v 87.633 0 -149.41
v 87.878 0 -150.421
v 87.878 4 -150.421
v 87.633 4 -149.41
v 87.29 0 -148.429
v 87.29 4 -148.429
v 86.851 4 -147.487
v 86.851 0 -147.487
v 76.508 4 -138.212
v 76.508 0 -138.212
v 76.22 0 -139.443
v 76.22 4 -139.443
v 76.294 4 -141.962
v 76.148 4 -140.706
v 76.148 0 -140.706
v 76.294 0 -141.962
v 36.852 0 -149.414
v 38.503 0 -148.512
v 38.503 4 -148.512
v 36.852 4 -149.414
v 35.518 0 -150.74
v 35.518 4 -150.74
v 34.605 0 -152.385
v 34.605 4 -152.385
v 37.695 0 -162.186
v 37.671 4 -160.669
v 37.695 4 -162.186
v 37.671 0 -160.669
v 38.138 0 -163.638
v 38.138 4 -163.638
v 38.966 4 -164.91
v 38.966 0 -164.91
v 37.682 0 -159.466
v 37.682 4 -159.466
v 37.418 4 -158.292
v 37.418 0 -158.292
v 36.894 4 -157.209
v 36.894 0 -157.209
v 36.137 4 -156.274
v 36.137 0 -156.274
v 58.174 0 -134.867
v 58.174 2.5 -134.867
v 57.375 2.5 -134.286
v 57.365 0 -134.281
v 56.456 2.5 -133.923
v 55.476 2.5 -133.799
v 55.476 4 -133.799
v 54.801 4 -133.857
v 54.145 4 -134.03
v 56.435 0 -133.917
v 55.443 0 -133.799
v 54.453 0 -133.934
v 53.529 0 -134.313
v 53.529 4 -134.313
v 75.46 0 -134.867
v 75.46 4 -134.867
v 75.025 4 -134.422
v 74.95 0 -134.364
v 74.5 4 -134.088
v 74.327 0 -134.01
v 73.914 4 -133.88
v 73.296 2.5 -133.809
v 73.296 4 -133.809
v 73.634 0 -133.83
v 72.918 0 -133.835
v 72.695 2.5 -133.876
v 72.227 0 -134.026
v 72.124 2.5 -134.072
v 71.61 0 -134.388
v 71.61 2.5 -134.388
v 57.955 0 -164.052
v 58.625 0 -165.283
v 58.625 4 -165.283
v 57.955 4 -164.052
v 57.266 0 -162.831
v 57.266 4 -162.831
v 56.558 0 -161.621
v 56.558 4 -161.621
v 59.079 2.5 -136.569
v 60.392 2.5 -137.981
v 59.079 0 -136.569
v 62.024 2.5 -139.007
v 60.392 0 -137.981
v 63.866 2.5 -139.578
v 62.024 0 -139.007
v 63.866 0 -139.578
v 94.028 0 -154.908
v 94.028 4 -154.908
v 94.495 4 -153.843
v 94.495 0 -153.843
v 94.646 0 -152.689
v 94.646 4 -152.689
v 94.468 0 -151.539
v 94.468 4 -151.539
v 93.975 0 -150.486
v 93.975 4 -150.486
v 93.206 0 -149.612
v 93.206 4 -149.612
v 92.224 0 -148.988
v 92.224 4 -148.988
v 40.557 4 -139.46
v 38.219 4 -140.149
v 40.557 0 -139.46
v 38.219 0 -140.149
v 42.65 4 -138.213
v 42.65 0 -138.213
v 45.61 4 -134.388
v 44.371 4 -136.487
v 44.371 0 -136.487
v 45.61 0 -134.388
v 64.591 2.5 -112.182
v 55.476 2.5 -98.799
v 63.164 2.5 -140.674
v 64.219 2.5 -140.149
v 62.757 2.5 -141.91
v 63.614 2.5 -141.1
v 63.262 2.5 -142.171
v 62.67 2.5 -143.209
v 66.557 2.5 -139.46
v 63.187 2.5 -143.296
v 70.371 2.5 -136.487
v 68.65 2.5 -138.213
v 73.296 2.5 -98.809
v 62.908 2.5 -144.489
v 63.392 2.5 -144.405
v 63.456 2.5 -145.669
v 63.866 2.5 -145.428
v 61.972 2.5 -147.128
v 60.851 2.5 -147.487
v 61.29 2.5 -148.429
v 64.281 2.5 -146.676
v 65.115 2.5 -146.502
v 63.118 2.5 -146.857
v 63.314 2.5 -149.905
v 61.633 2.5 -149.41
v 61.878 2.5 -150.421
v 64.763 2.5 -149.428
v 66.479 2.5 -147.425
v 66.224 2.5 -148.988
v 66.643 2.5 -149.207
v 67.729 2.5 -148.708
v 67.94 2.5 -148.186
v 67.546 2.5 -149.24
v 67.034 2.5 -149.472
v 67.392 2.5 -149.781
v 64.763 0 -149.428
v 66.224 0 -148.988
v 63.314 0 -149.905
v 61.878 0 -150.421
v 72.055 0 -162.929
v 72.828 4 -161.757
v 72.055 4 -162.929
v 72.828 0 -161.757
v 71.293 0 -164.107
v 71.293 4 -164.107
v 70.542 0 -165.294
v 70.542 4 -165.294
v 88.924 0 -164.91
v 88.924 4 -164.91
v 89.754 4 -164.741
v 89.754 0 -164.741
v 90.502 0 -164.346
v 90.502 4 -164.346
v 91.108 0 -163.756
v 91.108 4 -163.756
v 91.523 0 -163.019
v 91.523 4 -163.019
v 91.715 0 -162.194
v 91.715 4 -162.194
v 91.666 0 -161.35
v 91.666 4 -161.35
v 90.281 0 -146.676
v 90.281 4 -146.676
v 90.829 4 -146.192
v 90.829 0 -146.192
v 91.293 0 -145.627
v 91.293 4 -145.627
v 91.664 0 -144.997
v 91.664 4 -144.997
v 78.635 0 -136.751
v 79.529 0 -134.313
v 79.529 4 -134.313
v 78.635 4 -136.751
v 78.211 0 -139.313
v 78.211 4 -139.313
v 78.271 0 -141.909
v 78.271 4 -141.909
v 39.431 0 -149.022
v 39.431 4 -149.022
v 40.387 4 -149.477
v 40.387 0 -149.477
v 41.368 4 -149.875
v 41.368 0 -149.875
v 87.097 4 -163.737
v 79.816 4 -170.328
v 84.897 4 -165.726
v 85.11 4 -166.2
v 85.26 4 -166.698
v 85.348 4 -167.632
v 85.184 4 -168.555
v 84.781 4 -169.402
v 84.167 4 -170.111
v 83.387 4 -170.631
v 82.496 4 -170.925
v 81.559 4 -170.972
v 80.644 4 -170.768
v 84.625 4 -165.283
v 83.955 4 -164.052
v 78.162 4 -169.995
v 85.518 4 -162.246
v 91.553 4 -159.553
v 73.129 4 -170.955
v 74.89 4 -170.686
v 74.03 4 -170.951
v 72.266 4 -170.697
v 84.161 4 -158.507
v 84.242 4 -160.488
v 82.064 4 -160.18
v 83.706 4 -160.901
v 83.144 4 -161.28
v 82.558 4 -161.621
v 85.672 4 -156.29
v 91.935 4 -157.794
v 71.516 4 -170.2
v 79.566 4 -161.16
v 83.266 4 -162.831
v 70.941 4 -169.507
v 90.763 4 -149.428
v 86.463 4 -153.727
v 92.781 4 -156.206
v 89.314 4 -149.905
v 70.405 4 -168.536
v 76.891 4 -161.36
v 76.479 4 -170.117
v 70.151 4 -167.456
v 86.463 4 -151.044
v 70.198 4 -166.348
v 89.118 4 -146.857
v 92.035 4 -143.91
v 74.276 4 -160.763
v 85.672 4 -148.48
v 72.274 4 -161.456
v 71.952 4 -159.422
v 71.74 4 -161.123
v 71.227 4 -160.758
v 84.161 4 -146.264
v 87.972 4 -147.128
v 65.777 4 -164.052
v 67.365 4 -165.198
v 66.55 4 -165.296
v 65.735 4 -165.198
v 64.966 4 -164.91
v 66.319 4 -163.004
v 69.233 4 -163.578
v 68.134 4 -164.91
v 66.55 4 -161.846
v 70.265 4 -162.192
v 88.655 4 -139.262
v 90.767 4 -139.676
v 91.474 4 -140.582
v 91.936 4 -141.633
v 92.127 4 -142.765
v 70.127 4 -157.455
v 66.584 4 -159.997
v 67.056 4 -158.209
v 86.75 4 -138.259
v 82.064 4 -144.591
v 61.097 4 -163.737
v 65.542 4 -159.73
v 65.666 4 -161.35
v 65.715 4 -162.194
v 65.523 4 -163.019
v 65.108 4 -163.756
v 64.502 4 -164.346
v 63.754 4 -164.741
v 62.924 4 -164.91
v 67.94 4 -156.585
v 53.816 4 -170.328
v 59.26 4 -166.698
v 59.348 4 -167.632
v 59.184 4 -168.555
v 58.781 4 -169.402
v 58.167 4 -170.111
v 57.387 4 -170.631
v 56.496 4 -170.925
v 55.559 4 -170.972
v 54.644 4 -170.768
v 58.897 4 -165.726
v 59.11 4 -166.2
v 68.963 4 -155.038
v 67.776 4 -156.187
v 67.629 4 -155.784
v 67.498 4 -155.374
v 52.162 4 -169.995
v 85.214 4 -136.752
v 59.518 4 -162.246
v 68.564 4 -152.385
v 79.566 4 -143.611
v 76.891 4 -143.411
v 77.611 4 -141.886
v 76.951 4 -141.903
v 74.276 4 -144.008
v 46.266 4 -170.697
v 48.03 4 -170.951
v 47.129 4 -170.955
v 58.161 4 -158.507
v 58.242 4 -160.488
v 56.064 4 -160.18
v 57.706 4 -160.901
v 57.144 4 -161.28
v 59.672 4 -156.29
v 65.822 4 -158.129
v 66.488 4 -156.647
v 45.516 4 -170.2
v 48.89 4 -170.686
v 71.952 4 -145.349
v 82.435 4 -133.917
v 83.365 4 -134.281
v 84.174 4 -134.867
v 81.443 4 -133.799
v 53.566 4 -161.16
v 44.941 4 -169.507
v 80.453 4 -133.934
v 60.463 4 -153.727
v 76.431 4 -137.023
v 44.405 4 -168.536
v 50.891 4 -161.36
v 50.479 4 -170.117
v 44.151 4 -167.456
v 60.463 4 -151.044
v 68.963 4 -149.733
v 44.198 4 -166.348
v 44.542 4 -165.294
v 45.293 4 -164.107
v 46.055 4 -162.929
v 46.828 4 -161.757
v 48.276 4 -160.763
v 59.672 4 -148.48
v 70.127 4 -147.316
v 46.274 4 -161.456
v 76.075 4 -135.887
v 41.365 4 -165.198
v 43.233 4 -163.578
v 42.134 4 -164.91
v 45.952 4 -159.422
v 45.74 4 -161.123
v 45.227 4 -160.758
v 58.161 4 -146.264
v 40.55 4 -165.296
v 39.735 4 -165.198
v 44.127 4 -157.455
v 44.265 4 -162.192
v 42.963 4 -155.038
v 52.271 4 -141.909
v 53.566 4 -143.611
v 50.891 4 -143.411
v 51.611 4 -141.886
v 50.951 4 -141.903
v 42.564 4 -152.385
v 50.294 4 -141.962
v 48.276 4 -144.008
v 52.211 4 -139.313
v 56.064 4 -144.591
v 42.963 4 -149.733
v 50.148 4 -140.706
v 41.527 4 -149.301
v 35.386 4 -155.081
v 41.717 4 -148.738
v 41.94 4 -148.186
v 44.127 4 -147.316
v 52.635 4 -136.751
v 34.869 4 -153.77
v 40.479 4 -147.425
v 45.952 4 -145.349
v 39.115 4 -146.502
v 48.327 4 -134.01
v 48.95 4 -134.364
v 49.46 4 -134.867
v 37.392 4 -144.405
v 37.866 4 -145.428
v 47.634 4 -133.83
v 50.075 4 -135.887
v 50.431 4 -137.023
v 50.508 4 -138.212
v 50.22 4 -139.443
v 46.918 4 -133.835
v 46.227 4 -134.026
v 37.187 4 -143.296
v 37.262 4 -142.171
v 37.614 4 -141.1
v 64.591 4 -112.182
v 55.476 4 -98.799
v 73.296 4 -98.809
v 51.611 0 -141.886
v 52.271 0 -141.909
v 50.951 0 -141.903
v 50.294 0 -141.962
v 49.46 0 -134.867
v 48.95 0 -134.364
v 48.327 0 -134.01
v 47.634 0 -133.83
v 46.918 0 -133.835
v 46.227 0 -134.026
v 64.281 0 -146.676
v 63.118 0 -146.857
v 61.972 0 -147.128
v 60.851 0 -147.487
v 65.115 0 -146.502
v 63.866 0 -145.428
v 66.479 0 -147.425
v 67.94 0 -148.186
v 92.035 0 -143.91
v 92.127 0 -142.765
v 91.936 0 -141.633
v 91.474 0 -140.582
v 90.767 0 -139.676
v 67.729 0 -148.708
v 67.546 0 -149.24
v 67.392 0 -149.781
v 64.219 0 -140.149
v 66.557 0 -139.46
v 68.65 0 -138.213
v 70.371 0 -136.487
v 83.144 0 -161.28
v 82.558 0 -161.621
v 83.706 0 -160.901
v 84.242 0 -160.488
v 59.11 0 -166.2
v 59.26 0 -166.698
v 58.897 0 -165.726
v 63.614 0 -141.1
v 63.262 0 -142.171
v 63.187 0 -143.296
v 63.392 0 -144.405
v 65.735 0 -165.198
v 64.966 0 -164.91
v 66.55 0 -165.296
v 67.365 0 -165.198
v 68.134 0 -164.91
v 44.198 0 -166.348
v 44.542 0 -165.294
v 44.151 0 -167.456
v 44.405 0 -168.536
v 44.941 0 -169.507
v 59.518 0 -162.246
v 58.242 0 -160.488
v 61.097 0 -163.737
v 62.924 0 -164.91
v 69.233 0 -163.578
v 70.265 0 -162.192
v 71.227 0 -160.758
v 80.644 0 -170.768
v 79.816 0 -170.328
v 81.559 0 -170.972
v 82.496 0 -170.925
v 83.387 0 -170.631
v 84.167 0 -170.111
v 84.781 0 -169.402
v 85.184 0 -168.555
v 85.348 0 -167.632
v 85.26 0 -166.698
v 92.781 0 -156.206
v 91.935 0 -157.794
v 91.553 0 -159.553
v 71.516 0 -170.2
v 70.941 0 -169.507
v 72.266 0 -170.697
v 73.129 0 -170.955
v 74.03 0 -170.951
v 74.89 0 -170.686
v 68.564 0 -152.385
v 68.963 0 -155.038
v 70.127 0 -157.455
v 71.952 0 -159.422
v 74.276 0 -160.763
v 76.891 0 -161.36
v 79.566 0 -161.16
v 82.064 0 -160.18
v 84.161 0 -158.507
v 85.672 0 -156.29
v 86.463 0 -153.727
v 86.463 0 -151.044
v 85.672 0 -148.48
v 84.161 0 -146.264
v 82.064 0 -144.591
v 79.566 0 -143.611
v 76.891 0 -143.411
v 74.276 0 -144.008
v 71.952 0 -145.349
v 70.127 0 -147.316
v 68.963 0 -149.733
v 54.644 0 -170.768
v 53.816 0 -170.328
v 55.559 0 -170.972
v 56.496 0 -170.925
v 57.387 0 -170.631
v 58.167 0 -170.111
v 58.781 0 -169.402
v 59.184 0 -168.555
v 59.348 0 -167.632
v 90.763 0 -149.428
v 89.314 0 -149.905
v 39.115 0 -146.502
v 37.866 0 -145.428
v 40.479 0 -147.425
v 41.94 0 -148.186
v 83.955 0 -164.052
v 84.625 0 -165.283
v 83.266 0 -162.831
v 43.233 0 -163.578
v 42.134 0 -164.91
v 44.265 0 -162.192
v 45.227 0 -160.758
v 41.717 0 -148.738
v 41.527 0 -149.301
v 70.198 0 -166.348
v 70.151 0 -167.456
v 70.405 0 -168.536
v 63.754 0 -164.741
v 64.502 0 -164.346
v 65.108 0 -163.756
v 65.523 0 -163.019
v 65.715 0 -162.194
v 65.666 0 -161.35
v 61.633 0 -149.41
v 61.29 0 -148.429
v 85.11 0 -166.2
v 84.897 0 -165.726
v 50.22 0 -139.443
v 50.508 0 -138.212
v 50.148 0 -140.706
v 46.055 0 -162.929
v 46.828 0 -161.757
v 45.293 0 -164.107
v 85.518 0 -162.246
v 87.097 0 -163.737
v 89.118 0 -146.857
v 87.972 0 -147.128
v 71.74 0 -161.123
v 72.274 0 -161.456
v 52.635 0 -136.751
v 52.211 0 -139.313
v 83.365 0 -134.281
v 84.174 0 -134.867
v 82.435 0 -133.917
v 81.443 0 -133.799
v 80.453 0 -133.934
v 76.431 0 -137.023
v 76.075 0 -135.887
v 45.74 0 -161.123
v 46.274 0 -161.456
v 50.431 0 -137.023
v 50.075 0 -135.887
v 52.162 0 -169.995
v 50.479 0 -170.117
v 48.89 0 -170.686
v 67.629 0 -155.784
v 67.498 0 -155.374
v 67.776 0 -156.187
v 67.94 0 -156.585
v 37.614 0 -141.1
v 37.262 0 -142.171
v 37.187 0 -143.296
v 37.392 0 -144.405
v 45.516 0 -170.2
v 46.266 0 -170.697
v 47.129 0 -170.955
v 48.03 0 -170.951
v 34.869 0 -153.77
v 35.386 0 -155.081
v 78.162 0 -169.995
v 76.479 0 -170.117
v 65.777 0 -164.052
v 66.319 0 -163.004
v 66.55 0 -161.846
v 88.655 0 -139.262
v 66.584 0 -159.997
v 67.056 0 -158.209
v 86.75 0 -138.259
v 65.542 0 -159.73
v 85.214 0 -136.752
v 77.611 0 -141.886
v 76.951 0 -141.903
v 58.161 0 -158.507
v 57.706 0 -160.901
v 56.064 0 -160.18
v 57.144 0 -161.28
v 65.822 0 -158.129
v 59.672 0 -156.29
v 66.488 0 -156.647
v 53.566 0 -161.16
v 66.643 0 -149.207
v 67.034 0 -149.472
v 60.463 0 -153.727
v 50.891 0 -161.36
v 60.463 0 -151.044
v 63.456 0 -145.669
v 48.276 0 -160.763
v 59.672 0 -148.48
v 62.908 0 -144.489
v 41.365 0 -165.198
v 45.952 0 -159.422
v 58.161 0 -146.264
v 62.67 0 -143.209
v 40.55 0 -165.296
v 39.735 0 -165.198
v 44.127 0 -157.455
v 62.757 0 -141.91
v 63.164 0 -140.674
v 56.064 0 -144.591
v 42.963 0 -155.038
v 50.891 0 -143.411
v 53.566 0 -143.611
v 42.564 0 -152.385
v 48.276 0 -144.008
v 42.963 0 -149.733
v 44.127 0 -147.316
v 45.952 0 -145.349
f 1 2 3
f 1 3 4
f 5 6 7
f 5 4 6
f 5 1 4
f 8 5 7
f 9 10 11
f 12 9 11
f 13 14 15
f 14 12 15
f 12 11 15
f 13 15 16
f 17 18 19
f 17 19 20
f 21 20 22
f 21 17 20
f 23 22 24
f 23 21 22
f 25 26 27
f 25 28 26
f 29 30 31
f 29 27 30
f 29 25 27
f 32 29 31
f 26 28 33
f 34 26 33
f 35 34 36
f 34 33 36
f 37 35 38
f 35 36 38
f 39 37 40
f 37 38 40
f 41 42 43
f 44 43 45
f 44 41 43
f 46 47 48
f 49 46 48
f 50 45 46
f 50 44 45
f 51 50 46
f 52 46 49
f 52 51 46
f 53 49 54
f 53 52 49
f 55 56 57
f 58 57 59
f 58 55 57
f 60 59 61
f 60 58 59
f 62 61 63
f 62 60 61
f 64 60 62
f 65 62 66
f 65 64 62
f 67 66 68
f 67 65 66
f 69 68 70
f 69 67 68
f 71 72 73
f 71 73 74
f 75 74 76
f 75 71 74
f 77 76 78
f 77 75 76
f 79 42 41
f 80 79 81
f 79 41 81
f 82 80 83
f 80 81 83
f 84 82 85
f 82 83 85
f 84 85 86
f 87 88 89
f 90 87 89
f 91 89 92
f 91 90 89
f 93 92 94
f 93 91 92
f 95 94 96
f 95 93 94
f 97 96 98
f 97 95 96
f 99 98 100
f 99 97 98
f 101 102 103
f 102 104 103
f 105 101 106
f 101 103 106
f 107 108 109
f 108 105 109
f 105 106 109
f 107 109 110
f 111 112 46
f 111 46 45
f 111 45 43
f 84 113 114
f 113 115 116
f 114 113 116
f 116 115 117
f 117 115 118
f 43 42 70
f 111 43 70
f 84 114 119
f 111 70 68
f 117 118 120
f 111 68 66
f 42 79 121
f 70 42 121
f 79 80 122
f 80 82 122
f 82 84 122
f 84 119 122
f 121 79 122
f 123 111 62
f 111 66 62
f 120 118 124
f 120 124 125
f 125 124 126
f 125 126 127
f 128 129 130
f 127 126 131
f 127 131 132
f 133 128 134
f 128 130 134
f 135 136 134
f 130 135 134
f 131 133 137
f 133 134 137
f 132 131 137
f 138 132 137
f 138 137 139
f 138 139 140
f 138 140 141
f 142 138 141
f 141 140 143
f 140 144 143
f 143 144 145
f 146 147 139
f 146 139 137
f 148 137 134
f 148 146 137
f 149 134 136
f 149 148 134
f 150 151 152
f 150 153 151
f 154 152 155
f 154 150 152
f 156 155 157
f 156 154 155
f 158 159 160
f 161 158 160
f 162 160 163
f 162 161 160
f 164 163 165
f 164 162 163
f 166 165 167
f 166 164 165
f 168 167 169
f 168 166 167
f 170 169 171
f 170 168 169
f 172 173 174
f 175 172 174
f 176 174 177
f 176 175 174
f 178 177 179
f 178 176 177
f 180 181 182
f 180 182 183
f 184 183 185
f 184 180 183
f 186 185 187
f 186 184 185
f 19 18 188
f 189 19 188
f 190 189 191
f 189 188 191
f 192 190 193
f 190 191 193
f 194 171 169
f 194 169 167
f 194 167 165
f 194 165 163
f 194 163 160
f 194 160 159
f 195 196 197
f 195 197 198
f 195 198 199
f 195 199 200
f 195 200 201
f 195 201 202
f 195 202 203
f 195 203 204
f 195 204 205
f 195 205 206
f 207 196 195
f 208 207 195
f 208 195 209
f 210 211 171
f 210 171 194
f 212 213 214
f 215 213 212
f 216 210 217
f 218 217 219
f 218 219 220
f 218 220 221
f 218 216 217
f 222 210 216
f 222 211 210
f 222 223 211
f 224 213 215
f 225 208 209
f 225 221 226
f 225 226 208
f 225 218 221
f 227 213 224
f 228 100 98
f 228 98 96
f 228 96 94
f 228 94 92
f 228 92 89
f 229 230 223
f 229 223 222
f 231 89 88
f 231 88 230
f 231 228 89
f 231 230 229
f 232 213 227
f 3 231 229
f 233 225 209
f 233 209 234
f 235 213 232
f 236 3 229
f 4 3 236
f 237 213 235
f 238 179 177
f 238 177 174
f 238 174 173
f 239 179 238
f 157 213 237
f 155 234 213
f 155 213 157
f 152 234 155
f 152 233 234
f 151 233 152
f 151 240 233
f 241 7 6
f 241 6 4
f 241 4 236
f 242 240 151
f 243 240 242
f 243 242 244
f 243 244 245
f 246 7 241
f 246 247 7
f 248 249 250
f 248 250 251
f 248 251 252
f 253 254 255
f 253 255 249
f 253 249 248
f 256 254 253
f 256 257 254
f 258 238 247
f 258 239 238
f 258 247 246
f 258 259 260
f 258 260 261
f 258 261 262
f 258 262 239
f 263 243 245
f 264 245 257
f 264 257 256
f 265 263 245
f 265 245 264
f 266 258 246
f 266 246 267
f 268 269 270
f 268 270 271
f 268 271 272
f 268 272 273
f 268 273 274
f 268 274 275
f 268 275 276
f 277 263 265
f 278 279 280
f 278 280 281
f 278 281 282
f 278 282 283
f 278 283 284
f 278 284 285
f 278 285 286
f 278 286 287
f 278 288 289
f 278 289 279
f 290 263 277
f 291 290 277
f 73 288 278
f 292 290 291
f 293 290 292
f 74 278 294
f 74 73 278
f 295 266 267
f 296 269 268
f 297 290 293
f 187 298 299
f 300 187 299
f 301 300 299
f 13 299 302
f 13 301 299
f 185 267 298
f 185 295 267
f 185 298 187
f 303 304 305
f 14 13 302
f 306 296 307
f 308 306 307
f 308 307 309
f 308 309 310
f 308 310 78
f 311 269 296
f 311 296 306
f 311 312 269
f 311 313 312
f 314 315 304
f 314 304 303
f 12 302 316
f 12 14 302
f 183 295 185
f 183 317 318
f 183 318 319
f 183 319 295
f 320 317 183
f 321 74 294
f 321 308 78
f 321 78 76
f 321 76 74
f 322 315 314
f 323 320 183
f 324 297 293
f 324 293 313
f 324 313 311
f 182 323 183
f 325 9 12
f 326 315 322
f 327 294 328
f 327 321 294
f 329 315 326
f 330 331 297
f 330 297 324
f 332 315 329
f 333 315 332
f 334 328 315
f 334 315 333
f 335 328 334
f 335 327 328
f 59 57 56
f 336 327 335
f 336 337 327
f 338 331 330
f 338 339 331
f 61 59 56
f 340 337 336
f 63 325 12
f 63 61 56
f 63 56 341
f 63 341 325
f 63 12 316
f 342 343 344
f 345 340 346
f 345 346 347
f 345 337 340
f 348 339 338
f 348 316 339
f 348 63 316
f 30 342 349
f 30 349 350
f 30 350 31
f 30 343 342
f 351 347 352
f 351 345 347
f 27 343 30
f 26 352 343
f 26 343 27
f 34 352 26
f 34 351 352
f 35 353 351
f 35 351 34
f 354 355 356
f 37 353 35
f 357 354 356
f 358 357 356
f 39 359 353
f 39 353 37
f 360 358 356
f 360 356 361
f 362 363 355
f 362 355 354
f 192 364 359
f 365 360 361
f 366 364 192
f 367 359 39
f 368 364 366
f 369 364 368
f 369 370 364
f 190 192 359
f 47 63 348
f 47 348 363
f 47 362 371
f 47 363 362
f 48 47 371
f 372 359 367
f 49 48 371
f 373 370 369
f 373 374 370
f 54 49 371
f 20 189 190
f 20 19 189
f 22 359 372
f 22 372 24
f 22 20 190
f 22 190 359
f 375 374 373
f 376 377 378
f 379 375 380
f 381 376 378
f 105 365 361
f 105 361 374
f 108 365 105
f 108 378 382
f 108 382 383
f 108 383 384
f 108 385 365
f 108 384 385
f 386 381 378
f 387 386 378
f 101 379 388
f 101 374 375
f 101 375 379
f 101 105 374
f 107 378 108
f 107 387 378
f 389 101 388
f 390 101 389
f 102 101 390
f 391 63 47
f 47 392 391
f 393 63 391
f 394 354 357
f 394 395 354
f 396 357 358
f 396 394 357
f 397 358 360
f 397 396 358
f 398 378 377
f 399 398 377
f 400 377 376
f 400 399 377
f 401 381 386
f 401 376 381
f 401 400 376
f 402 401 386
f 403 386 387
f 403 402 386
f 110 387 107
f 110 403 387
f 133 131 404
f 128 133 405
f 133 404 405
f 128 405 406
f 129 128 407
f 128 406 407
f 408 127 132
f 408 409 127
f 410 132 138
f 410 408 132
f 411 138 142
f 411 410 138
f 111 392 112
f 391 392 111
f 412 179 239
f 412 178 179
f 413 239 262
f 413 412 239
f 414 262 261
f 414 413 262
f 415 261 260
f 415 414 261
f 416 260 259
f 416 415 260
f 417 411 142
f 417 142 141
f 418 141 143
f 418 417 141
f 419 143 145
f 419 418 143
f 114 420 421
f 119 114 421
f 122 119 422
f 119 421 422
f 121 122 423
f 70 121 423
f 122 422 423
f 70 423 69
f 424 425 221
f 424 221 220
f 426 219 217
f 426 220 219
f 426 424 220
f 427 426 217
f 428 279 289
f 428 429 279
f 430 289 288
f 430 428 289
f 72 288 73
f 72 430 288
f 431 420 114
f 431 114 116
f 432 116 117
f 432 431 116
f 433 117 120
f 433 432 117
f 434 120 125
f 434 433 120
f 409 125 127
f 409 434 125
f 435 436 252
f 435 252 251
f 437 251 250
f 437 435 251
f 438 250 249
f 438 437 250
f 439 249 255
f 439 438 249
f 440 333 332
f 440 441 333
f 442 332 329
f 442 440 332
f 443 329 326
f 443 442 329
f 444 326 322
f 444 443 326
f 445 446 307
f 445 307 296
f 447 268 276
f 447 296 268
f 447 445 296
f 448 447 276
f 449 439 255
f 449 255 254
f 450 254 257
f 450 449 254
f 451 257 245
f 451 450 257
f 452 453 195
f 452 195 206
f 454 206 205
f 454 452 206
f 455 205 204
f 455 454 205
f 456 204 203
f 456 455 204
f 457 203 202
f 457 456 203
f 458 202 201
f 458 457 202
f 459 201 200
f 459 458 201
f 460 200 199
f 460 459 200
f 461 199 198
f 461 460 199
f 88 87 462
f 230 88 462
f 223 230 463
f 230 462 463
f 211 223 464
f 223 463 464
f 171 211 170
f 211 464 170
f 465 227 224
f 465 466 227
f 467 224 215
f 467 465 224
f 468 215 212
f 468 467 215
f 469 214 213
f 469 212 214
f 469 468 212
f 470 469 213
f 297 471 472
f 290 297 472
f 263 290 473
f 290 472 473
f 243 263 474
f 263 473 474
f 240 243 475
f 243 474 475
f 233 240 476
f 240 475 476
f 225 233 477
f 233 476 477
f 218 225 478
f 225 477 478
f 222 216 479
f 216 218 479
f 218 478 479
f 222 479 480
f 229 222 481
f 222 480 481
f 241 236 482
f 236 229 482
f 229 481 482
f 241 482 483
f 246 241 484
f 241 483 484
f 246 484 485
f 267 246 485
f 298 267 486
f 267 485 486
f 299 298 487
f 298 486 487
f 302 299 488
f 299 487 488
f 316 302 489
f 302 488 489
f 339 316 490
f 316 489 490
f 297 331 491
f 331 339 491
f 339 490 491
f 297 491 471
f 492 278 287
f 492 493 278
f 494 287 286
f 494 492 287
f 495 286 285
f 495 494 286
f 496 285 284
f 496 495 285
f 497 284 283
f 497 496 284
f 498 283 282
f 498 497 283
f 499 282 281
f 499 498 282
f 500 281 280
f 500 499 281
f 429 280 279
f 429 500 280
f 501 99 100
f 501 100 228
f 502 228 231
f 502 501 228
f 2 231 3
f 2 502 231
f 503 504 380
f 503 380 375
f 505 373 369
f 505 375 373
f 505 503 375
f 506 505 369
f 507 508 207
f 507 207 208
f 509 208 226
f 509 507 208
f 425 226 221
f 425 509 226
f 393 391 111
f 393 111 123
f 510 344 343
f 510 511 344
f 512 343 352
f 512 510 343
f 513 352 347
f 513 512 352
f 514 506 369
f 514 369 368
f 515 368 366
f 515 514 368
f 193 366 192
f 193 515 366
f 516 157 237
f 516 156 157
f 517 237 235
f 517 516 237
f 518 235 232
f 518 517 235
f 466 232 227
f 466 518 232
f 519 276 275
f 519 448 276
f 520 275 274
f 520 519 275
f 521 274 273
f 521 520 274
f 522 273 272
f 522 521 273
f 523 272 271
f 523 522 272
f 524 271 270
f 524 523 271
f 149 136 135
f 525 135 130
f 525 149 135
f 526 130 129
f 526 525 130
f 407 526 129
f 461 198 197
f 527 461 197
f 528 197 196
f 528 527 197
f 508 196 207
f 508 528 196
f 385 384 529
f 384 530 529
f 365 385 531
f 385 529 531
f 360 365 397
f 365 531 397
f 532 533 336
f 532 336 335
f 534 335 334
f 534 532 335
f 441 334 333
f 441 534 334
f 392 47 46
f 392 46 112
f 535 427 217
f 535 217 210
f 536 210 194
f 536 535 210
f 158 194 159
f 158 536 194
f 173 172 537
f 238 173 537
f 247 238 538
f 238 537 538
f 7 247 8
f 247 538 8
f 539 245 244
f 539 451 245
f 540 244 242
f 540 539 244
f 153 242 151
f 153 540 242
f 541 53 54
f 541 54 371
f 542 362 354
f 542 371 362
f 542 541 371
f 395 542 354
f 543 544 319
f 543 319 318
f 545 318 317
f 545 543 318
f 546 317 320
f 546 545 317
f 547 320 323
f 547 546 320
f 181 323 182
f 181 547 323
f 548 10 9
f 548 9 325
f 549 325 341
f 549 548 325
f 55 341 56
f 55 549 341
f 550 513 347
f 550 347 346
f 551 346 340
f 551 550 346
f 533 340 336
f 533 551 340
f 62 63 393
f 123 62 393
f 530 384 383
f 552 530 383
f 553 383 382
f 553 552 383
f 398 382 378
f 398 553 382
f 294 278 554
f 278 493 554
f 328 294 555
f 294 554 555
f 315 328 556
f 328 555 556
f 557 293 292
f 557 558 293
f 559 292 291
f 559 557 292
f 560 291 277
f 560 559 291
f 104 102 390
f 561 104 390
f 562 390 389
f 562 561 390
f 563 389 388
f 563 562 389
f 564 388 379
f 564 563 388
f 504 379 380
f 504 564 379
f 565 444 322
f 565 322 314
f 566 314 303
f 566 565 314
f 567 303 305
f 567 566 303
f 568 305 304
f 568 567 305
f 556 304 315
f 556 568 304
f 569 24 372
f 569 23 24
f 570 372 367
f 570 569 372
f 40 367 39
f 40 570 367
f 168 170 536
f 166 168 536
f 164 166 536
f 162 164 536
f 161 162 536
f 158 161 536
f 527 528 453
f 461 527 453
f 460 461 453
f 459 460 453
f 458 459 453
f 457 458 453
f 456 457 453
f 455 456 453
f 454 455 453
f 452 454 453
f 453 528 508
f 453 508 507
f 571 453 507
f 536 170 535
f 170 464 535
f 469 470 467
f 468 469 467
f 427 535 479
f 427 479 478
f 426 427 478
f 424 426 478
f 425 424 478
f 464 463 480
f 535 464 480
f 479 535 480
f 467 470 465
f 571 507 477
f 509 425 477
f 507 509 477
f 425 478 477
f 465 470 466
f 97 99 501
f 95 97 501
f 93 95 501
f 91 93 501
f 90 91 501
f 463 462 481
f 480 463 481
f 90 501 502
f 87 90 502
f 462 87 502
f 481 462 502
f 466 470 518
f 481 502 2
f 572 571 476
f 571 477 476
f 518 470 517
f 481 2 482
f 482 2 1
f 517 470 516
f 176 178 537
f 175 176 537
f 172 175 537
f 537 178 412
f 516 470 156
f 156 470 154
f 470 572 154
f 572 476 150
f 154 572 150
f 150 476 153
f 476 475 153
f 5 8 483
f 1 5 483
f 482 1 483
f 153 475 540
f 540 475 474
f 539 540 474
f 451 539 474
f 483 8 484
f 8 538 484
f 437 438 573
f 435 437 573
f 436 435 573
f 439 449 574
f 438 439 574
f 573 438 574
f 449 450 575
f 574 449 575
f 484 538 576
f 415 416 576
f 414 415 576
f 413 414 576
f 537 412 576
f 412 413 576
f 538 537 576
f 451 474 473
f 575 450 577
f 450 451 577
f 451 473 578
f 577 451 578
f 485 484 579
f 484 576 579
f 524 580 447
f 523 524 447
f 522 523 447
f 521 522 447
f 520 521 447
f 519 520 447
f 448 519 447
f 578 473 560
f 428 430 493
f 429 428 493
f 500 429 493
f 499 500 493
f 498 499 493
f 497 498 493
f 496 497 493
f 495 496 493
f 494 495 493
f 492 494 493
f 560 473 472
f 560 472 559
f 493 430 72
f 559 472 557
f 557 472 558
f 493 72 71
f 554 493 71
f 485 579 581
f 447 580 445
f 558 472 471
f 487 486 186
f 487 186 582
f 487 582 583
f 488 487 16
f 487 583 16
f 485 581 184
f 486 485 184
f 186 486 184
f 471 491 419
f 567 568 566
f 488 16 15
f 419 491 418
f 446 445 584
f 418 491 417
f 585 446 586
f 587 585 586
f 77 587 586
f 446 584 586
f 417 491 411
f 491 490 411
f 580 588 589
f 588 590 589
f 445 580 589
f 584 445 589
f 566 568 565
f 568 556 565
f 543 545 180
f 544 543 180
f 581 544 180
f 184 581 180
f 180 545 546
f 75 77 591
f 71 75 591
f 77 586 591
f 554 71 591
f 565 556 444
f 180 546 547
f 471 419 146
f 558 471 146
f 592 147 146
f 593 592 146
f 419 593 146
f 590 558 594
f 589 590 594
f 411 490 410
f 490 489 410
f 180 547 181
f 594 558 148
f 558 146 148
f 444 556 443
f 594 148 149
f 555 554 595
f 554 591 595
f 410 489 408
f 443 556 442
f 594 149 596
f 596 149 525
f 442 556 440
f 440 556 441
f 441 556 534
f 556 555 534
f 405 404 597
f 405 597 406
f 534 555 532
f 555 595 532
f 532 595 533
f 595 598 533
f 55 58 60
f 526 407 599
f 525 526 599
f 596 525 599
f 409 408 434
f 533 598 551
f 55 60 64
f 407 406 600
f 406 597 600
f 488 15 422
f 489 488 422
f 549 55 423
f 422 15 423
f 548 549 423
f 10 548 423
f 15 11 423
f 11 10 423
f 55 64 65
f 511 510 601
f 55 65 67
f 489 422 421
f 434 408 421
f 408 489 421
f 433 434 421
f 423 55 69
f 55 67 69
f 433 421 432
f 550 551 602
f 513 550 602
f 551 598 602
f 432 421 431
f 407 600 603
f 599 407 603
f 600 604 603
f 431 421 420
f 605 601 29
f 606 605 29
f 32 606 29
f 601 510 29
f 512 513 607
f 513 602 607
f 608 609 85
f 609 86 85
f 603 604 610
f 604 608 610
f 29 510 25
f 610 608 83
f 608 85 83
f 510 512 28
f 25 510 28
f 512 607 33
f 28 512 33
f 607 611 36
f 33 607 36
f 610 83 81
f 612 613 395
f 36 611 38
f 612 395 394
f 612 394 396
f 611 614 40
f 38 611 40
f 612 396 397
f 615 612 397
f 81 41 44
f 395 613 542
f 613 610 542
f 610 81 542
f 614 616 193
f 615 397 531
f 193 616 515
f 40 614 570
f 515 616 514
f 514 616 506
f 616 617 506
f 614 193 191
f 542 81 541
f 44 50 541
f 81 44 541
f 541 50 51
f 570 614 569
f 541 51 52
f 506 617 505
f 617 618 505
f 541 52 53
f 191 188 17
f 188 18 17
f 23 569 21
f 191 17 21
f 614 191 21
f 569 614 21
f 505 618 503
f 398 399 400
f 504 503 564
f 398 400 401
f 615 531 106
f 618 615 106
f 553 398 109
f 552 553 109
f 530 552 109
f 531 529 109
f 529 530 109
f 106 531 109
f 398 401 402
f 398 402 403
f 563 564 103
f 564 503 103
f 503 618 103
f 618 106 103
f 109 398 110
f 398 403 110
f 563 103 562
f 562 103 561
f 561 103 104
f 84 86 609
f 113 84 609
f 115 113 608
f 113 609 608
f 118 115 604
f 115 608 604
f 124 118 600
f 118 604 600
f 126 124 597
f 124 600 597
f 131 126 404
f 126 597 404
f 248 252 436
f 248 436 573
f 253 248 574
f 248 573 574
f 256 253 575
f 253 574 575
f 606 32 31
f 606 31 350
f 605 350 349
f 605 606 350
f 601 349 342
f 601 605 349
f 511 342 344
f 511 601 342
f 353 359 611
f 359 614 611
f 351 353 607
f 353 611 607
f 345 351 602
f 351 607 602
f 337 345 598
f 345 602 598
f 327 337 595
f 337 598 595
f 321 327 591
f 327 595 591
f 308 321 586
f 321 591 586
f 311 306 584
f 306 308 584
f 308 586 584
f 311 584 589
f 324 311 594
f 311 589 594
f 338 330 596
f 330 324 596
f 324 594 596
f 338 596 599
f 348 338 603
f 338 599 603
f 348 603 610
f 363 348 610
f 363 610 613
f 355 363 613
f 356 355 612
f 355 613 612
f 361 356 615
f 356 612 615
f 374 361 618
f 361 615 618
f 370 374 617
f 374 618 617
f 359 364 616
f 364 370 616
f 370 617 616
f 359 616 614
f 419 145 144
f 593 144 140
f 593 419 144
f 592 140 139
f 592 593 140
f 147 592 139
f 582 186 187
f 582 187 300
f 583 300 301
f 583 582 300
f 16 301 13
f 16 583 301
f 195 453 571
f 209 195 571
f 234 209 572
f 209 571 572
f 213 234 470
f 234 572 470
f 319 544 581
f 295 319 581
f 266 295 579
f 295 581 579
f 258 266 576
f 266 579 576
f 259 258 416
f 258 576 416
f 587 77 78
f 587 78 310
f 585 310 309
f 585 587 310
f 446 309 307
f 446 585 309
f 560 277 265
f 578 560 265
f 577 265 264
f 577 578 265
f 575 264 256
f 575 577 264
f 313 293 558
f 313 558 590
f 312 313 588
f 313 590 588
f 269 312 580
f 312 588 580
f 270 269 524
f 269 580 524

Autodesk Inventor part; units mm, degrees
ref_plane "YZ Plane" through (0, 0, 0) normal (1, 0, 0) x (0, 1, 0)
ref_plane "XZ Plane" through (0, 0, 0) normal (0, 1, 0) x (-1, 0, 0)
ref_plane "XY Plane" through (0, 0, 0) normal (0, 0, 1) x (1, 0, 0)
sketch "Sketch1" plane through (0, 0, 0) normal (0, 1, 0) x (-1, 0, 0)
  arc A0 (-50.2935, -141.9625) -> (-50.5085, -138.2118) centre (-57.4787, -140.493) ccw
  arc A1 (-49.4604, -134.8668) -> (-50.5085, -138.2118) centre (-45.5145, -137.94) ccw
  arc A2 (-52.2706, -141.9093) -> (-53.5294, -134.3132) centre (-66.0628, -140.2926) ccw
  arc A3 (-60.8507, -147.4866) -> (-64.2809, -146.6761) centre (-66.0428, -161.7965) ccw
  circle A4 centre (-51.5636, -152.3854) radius 9
  arc A5 (-45.2271, -160.758) -> (-42.1345, -164.9104) centre (-15.6123, -141.9291) ccw
  arc A6 (-38.966, -164.9101) -> (-37.6707, -160.6686) centre (-43.0606, -161.3412) ccw
  arc A7 (-44.5421, -165.2935) -> (-46.8275, -161.7567) centre (-172.1244, -245.2288) ccw
  arc A8 (-37.8657, -145.4277) -> (-38.2191, -140.1494) centre (-41.6996, -143.0334) ccw
  arc A9 (-45.6096, -134.3885) -> (-38.2191, -140.1494) centre (-36.6467, -130.5112) ccw
  arc A10 (-36.1368, -156.274) -> (-37.6707, -160.6686) centre (-32.4682, -160.0194) ccw
  arc A11 (-36.1368, -156.274) -> (-34.6048, -152.385) centre (-42.1305, -151.6666) ccw
  arc A12 (-41.3682, -149.8747) -> (-38.503, -148.5121) centre (-47.6774, -132.9147) ccw
  arc A13 (-41.9398, -148.1863) -> (-37.8657, -145.4277) centre (-47.8277, -135.103) ccw
  arc A14 (-34.6048, -152.385) -> (-38.503, -148.5121) centre (-40.8573, -154.78) ccw
  arc A15 (-63.8657, -139.5775) -> (-58.174, -134.8668) centre (-65.1246, -132.2626) ccw
  arc A16 (-53.5294, -134.3132) -> (-58.174, -134.8668) centre (-55.4761, -137.7415) ccw
  arc A17 (-45.6096, -134.3885) -> (-49.4604, -134.8668) centre (-47.2959, -136.5525) ccw
  line L0 (-46.3394, -171.0352) -> (-46.3407, -171.0345)
  arc A18 (-48.8902, -170.6862) -> (-44.9412, -169.507) centre (-47.5666, -167.9168) ccw
  arc A19 (-65.6657, -161.3497) -> (-62.9245, -164.9101) centre (-62.7518, -161.9418) ccw
  arc A20 (-62.9245, -164.9101) -> (-58.2423, -160.4876) centre (-68.2851, -154.5449) ccw
  arc A21 (-56.5584, -161.6213) -> (-58.6246, -165.2834) centre (21.5695, -208.1162) ccw
  arc A22 (-58.6246, -165.2834) -> (-59.26, -166.6979) centre (-55.3426, -167.6077) ccw
  arc A23 (-59.26, -166.6979) -> (-53.816, -170.3276) centre (-55.8552, -167.4887) ccw
  arc A24 (-48.8902, -170.6862) -> (-53.816, -170.3276) centre (-51.7693, -176.2225) ccw
  arc A25 (-65.6657, -161.3497) -> (-67.4979, -155.3741) centre (-72.0774, -160.047) ccw
  arc A26 (-61.8781, -150.4206) -> (-66.2243, -148.9882) centre (-82.2432, -204.906) ccw
  arc A27 (-42.1345, -164.9104) -> (-38.966, -164.9101) centre (-40.5505, -161.8463) ccw
  arc A28 (-44.9412, -169.507) -> (-44.5421, -165.2935) centre (-48.2055, -167.0721) ccw
  arc A29 (-76.2935, -141.9625) -> (-76.5085, -138.2118) centre (-83.4787, -140.493) ccw
  arc A30 (-75.4604, -134.8668) -> (-76.5085, -138.2118) centre (-71.5145, -137.94) ccw
  arc A31 (-78.2706, -141.9093) -> (-79.5294, -134.3132) centre (-92.0628, -140.2926) ccw
  arc A32 (-86.8507, -147.4866) -> (-90.2809, -146.6761) centre (-92.0428, -161.7965) ccw
  circle A33 centre (-77.5636, -152.3854) radius 9
  arc A34 (-71.2271, -160.758) -> (-68.1345, -164.9104) centre (-41.6123, -141.9291) ccw
  arc A35 (-70.5421, -165.2935) -> (-72.8275, -161.7567) centre (-198.1244, -245.2288) ccw
  arc A36 (-63.8657, -145.4277) -> (-64.2191, -140.1494) centre (-67.6996, -143.0334) ccw
  arc A37 (-71.6096, -134.3885) -> (-64.2191, -140.1494) centre (-62.6467, -130.5112) ccw
  arc A38 (-67.9398, -148.1863) -> (-63.8657, -145.4277) centre (-73.8277, -135.103) ccw
  arc A39 (-90.7671, -139.6764) -> (-84.174, -134.8668) centre (-91.1246, -132.2626) ccw
  arc A40 (-79.5294, -134.3132) -> (-84.174, -134.8668) centre (-81.4761, -137.7415) ccw
  arc A41 (-71.6096, -134.3885) -> (-75.4604, -134.8668) centre (-73.2959, -136.5525) ccw
  line L1 (-72.3394, -171.0352) -> (-72.3407, -171.0345)
  arc A42 (-74.8902, -170.6862) -> (-70.9412, -169.507) centre (-73.5666, -167.9168) ccw
  arc A43 (-91.6657, -161.3497) -> (-88.9245, -164.9101) centre (-88.7518, -161.9418) ccw
  arc A44 (-88.9245, -164.9101) -> (-84.2423, -160.4876) centre (-94.2851, -154.5449) ccw
  arc A45 (-82.5584, -161.6213) -> (-84.6246, -165.2834) centre (-4.4305, -208.1162) ccw
  arc A46 (-84.6246, -165.2834) -> (-85.26, -166.6979) centre (-81.3426, -167.6077) ccw
  arc A47 (-85.26, -166.6979) -> (-79.816, -170.3276) centre (-81.8552, -167.4887) ccw
  arc A48 (-74.8902, -170.6862) -> (-79.816, -170.3276) centre (-77.7693, -176.2225) ccw
  arc A49 (-91.6639, -144.9966) -> (-90.2809, -146.6761) centre (-87.4857, -142.9652) ccw
  arc A50 (-90.7671, -139.6764) -> (-91.6639, -144.9966) centre (-87.4857, -142.9652) ccw
  arc A51 (-91.6657, -161.3497) -> (-94.028, -154.908) centre (-98.0774, -160.047) ccw
  arc A52 (-92.2243, -148.9882) -> (-94.028, -154.908) centre (-90.5316, -152.7386) ccw
  arc A53 (-87.8781, -150.4206) -> (-92.2243, -148.9882) centre (-108.2432, -204.906) ccw
  arc A54 (-68.1345, -164.9104) -> (-64.966, -164.9101) centre (-66.5505, -161.8463) ccw
  arc A55 (-70.9412, -169.507) -> (-70.5421, -165.2935) centre (-74.2055, -167.0721) ccw
  arc A56 (-66.2243, -148.9882) -> (-67.3918, -149.7806) centre (-64.5316, -152.7386) ccw
  circle A57 centre (-51.5636, -152.3854) radius 10.5
  circle A58 centre (-77.5636, -152.3854) radius 10.5
  arc A59 (-66.5505, -161.8463) -> (-64.966, -164.9101) centre (-62.3299, -161.6052) ccw
  arc A60 (-66.5505, -161.8463) -> (-67.9398, -156.5846) centre (-74.2403, -161.0624) ccw
  arc A61 (-64.2809, -146.6761) -> (-63.8657, -139.5775) centre (-67.8597, -142.9054) ccw
  line L2 (-53.5294, -134.3132) -> (-53.5294, -99.3132)
  line L3 (-53.5294, -99.3132) -> (-75.4604, -134.8668)
  line L4 (-75.4604, -134.8668) -> (-75.4604, -99.3132)
  line L5 (-75.4604, -99.3132) -> (-53.5294, -134.3132)
  point P0 (0, 0)
  point P1 (-51.4803, -152.4063)
  point P2 (-45.3977, -162.821)
  point P3 (-45.3977, -141.9574)
  point P4 (-33.5868, -132.2626)
  point P5 (-34.505, -161.7965)
  point P6 (-36.7472, -154.5449)
  point P7 (-47.2742, -170.9723)
  point P8 (-57.8397, -162.8189)
  point P9 (-56.1478, -170.9718)
  point P10 (-71.3977, -162.821)
  point P11 (-71.3977, -141.9574)
  point P12 (-59.5868, -132.2626)
  point P13 (-60.505, -161.7965)
  point P14 (-62.7472, -154.5449)
  point P15 (-73.2742, -170.9723)
  point P16 (-83.8397, -162.8189)
  point P17 (-82.1478, -170.9718)
  dimension "d2" = 21
  dimension "d3" = 21
  dimension "d0" = 18
  dimension "d1" = 18
  dimension "d6" = 35
extrude "Extrusion1" add sketch "Sketch1" along normal blind 4 contours A0 A1 A17 A9 A8 A13 A57 | A57 | A57 A3 A61 A15 A16 A2 | A12 A14 A11 A10 A6 A27 A5 A57 | A57 A20 A19 A25 A58 A56 A26 | A41 A37 A36 A38 A58 A29 A30 | A7 A28 A18 A24 A23 A22 A21 A57 | A58 | A58 A32 A49 A50 A39 A40 A31 | A60 A59 A54 A34 A58 | A58 A44 A43 A51 A52 A53 | A35 A55 A42 A48 A47 A46 A45 A58
sketch "Sketch3" plane through (0, 4, 0) normal (0, 1, 0) x (1, 0, 0)
  arc A0 (53.5294, 134.3132) -> (58.174, 134.8668) centre (55.4761, 137.7415) ccw projected
  line L0 (55.4761, 133.799) -> (55.4761, 98.799)
  arc A1 (71.6096, 134.3885) -> (75.4604, 134.8668) centre (73.2959, 136.5525) ccw projected
  line L1 (73.2959, 133.8091) -> (73.2959, 98.8091)
  line L2 (55.4761, 133.799) -> (61.5958, 151.1662)
  line L3 (61.5958, 151.1662) -> (68.0809, 150.5767)
  line L4 (68.0809, 150.5767) -> (73.2959, 133.8091)
  line L5 (55.4761, 98.799) -> (64.5905, 112.1825)
  line L6 (64.5905, 112.1825) -> (73.2959, 98.8091)
  point P0 (0, 0)
  dimension "d7" = 35
  dimension "d8" = 35
extrude "Extrusion2" add sketch "Sketch3" against normal blind 1.5
properties part number "RosaV2"
